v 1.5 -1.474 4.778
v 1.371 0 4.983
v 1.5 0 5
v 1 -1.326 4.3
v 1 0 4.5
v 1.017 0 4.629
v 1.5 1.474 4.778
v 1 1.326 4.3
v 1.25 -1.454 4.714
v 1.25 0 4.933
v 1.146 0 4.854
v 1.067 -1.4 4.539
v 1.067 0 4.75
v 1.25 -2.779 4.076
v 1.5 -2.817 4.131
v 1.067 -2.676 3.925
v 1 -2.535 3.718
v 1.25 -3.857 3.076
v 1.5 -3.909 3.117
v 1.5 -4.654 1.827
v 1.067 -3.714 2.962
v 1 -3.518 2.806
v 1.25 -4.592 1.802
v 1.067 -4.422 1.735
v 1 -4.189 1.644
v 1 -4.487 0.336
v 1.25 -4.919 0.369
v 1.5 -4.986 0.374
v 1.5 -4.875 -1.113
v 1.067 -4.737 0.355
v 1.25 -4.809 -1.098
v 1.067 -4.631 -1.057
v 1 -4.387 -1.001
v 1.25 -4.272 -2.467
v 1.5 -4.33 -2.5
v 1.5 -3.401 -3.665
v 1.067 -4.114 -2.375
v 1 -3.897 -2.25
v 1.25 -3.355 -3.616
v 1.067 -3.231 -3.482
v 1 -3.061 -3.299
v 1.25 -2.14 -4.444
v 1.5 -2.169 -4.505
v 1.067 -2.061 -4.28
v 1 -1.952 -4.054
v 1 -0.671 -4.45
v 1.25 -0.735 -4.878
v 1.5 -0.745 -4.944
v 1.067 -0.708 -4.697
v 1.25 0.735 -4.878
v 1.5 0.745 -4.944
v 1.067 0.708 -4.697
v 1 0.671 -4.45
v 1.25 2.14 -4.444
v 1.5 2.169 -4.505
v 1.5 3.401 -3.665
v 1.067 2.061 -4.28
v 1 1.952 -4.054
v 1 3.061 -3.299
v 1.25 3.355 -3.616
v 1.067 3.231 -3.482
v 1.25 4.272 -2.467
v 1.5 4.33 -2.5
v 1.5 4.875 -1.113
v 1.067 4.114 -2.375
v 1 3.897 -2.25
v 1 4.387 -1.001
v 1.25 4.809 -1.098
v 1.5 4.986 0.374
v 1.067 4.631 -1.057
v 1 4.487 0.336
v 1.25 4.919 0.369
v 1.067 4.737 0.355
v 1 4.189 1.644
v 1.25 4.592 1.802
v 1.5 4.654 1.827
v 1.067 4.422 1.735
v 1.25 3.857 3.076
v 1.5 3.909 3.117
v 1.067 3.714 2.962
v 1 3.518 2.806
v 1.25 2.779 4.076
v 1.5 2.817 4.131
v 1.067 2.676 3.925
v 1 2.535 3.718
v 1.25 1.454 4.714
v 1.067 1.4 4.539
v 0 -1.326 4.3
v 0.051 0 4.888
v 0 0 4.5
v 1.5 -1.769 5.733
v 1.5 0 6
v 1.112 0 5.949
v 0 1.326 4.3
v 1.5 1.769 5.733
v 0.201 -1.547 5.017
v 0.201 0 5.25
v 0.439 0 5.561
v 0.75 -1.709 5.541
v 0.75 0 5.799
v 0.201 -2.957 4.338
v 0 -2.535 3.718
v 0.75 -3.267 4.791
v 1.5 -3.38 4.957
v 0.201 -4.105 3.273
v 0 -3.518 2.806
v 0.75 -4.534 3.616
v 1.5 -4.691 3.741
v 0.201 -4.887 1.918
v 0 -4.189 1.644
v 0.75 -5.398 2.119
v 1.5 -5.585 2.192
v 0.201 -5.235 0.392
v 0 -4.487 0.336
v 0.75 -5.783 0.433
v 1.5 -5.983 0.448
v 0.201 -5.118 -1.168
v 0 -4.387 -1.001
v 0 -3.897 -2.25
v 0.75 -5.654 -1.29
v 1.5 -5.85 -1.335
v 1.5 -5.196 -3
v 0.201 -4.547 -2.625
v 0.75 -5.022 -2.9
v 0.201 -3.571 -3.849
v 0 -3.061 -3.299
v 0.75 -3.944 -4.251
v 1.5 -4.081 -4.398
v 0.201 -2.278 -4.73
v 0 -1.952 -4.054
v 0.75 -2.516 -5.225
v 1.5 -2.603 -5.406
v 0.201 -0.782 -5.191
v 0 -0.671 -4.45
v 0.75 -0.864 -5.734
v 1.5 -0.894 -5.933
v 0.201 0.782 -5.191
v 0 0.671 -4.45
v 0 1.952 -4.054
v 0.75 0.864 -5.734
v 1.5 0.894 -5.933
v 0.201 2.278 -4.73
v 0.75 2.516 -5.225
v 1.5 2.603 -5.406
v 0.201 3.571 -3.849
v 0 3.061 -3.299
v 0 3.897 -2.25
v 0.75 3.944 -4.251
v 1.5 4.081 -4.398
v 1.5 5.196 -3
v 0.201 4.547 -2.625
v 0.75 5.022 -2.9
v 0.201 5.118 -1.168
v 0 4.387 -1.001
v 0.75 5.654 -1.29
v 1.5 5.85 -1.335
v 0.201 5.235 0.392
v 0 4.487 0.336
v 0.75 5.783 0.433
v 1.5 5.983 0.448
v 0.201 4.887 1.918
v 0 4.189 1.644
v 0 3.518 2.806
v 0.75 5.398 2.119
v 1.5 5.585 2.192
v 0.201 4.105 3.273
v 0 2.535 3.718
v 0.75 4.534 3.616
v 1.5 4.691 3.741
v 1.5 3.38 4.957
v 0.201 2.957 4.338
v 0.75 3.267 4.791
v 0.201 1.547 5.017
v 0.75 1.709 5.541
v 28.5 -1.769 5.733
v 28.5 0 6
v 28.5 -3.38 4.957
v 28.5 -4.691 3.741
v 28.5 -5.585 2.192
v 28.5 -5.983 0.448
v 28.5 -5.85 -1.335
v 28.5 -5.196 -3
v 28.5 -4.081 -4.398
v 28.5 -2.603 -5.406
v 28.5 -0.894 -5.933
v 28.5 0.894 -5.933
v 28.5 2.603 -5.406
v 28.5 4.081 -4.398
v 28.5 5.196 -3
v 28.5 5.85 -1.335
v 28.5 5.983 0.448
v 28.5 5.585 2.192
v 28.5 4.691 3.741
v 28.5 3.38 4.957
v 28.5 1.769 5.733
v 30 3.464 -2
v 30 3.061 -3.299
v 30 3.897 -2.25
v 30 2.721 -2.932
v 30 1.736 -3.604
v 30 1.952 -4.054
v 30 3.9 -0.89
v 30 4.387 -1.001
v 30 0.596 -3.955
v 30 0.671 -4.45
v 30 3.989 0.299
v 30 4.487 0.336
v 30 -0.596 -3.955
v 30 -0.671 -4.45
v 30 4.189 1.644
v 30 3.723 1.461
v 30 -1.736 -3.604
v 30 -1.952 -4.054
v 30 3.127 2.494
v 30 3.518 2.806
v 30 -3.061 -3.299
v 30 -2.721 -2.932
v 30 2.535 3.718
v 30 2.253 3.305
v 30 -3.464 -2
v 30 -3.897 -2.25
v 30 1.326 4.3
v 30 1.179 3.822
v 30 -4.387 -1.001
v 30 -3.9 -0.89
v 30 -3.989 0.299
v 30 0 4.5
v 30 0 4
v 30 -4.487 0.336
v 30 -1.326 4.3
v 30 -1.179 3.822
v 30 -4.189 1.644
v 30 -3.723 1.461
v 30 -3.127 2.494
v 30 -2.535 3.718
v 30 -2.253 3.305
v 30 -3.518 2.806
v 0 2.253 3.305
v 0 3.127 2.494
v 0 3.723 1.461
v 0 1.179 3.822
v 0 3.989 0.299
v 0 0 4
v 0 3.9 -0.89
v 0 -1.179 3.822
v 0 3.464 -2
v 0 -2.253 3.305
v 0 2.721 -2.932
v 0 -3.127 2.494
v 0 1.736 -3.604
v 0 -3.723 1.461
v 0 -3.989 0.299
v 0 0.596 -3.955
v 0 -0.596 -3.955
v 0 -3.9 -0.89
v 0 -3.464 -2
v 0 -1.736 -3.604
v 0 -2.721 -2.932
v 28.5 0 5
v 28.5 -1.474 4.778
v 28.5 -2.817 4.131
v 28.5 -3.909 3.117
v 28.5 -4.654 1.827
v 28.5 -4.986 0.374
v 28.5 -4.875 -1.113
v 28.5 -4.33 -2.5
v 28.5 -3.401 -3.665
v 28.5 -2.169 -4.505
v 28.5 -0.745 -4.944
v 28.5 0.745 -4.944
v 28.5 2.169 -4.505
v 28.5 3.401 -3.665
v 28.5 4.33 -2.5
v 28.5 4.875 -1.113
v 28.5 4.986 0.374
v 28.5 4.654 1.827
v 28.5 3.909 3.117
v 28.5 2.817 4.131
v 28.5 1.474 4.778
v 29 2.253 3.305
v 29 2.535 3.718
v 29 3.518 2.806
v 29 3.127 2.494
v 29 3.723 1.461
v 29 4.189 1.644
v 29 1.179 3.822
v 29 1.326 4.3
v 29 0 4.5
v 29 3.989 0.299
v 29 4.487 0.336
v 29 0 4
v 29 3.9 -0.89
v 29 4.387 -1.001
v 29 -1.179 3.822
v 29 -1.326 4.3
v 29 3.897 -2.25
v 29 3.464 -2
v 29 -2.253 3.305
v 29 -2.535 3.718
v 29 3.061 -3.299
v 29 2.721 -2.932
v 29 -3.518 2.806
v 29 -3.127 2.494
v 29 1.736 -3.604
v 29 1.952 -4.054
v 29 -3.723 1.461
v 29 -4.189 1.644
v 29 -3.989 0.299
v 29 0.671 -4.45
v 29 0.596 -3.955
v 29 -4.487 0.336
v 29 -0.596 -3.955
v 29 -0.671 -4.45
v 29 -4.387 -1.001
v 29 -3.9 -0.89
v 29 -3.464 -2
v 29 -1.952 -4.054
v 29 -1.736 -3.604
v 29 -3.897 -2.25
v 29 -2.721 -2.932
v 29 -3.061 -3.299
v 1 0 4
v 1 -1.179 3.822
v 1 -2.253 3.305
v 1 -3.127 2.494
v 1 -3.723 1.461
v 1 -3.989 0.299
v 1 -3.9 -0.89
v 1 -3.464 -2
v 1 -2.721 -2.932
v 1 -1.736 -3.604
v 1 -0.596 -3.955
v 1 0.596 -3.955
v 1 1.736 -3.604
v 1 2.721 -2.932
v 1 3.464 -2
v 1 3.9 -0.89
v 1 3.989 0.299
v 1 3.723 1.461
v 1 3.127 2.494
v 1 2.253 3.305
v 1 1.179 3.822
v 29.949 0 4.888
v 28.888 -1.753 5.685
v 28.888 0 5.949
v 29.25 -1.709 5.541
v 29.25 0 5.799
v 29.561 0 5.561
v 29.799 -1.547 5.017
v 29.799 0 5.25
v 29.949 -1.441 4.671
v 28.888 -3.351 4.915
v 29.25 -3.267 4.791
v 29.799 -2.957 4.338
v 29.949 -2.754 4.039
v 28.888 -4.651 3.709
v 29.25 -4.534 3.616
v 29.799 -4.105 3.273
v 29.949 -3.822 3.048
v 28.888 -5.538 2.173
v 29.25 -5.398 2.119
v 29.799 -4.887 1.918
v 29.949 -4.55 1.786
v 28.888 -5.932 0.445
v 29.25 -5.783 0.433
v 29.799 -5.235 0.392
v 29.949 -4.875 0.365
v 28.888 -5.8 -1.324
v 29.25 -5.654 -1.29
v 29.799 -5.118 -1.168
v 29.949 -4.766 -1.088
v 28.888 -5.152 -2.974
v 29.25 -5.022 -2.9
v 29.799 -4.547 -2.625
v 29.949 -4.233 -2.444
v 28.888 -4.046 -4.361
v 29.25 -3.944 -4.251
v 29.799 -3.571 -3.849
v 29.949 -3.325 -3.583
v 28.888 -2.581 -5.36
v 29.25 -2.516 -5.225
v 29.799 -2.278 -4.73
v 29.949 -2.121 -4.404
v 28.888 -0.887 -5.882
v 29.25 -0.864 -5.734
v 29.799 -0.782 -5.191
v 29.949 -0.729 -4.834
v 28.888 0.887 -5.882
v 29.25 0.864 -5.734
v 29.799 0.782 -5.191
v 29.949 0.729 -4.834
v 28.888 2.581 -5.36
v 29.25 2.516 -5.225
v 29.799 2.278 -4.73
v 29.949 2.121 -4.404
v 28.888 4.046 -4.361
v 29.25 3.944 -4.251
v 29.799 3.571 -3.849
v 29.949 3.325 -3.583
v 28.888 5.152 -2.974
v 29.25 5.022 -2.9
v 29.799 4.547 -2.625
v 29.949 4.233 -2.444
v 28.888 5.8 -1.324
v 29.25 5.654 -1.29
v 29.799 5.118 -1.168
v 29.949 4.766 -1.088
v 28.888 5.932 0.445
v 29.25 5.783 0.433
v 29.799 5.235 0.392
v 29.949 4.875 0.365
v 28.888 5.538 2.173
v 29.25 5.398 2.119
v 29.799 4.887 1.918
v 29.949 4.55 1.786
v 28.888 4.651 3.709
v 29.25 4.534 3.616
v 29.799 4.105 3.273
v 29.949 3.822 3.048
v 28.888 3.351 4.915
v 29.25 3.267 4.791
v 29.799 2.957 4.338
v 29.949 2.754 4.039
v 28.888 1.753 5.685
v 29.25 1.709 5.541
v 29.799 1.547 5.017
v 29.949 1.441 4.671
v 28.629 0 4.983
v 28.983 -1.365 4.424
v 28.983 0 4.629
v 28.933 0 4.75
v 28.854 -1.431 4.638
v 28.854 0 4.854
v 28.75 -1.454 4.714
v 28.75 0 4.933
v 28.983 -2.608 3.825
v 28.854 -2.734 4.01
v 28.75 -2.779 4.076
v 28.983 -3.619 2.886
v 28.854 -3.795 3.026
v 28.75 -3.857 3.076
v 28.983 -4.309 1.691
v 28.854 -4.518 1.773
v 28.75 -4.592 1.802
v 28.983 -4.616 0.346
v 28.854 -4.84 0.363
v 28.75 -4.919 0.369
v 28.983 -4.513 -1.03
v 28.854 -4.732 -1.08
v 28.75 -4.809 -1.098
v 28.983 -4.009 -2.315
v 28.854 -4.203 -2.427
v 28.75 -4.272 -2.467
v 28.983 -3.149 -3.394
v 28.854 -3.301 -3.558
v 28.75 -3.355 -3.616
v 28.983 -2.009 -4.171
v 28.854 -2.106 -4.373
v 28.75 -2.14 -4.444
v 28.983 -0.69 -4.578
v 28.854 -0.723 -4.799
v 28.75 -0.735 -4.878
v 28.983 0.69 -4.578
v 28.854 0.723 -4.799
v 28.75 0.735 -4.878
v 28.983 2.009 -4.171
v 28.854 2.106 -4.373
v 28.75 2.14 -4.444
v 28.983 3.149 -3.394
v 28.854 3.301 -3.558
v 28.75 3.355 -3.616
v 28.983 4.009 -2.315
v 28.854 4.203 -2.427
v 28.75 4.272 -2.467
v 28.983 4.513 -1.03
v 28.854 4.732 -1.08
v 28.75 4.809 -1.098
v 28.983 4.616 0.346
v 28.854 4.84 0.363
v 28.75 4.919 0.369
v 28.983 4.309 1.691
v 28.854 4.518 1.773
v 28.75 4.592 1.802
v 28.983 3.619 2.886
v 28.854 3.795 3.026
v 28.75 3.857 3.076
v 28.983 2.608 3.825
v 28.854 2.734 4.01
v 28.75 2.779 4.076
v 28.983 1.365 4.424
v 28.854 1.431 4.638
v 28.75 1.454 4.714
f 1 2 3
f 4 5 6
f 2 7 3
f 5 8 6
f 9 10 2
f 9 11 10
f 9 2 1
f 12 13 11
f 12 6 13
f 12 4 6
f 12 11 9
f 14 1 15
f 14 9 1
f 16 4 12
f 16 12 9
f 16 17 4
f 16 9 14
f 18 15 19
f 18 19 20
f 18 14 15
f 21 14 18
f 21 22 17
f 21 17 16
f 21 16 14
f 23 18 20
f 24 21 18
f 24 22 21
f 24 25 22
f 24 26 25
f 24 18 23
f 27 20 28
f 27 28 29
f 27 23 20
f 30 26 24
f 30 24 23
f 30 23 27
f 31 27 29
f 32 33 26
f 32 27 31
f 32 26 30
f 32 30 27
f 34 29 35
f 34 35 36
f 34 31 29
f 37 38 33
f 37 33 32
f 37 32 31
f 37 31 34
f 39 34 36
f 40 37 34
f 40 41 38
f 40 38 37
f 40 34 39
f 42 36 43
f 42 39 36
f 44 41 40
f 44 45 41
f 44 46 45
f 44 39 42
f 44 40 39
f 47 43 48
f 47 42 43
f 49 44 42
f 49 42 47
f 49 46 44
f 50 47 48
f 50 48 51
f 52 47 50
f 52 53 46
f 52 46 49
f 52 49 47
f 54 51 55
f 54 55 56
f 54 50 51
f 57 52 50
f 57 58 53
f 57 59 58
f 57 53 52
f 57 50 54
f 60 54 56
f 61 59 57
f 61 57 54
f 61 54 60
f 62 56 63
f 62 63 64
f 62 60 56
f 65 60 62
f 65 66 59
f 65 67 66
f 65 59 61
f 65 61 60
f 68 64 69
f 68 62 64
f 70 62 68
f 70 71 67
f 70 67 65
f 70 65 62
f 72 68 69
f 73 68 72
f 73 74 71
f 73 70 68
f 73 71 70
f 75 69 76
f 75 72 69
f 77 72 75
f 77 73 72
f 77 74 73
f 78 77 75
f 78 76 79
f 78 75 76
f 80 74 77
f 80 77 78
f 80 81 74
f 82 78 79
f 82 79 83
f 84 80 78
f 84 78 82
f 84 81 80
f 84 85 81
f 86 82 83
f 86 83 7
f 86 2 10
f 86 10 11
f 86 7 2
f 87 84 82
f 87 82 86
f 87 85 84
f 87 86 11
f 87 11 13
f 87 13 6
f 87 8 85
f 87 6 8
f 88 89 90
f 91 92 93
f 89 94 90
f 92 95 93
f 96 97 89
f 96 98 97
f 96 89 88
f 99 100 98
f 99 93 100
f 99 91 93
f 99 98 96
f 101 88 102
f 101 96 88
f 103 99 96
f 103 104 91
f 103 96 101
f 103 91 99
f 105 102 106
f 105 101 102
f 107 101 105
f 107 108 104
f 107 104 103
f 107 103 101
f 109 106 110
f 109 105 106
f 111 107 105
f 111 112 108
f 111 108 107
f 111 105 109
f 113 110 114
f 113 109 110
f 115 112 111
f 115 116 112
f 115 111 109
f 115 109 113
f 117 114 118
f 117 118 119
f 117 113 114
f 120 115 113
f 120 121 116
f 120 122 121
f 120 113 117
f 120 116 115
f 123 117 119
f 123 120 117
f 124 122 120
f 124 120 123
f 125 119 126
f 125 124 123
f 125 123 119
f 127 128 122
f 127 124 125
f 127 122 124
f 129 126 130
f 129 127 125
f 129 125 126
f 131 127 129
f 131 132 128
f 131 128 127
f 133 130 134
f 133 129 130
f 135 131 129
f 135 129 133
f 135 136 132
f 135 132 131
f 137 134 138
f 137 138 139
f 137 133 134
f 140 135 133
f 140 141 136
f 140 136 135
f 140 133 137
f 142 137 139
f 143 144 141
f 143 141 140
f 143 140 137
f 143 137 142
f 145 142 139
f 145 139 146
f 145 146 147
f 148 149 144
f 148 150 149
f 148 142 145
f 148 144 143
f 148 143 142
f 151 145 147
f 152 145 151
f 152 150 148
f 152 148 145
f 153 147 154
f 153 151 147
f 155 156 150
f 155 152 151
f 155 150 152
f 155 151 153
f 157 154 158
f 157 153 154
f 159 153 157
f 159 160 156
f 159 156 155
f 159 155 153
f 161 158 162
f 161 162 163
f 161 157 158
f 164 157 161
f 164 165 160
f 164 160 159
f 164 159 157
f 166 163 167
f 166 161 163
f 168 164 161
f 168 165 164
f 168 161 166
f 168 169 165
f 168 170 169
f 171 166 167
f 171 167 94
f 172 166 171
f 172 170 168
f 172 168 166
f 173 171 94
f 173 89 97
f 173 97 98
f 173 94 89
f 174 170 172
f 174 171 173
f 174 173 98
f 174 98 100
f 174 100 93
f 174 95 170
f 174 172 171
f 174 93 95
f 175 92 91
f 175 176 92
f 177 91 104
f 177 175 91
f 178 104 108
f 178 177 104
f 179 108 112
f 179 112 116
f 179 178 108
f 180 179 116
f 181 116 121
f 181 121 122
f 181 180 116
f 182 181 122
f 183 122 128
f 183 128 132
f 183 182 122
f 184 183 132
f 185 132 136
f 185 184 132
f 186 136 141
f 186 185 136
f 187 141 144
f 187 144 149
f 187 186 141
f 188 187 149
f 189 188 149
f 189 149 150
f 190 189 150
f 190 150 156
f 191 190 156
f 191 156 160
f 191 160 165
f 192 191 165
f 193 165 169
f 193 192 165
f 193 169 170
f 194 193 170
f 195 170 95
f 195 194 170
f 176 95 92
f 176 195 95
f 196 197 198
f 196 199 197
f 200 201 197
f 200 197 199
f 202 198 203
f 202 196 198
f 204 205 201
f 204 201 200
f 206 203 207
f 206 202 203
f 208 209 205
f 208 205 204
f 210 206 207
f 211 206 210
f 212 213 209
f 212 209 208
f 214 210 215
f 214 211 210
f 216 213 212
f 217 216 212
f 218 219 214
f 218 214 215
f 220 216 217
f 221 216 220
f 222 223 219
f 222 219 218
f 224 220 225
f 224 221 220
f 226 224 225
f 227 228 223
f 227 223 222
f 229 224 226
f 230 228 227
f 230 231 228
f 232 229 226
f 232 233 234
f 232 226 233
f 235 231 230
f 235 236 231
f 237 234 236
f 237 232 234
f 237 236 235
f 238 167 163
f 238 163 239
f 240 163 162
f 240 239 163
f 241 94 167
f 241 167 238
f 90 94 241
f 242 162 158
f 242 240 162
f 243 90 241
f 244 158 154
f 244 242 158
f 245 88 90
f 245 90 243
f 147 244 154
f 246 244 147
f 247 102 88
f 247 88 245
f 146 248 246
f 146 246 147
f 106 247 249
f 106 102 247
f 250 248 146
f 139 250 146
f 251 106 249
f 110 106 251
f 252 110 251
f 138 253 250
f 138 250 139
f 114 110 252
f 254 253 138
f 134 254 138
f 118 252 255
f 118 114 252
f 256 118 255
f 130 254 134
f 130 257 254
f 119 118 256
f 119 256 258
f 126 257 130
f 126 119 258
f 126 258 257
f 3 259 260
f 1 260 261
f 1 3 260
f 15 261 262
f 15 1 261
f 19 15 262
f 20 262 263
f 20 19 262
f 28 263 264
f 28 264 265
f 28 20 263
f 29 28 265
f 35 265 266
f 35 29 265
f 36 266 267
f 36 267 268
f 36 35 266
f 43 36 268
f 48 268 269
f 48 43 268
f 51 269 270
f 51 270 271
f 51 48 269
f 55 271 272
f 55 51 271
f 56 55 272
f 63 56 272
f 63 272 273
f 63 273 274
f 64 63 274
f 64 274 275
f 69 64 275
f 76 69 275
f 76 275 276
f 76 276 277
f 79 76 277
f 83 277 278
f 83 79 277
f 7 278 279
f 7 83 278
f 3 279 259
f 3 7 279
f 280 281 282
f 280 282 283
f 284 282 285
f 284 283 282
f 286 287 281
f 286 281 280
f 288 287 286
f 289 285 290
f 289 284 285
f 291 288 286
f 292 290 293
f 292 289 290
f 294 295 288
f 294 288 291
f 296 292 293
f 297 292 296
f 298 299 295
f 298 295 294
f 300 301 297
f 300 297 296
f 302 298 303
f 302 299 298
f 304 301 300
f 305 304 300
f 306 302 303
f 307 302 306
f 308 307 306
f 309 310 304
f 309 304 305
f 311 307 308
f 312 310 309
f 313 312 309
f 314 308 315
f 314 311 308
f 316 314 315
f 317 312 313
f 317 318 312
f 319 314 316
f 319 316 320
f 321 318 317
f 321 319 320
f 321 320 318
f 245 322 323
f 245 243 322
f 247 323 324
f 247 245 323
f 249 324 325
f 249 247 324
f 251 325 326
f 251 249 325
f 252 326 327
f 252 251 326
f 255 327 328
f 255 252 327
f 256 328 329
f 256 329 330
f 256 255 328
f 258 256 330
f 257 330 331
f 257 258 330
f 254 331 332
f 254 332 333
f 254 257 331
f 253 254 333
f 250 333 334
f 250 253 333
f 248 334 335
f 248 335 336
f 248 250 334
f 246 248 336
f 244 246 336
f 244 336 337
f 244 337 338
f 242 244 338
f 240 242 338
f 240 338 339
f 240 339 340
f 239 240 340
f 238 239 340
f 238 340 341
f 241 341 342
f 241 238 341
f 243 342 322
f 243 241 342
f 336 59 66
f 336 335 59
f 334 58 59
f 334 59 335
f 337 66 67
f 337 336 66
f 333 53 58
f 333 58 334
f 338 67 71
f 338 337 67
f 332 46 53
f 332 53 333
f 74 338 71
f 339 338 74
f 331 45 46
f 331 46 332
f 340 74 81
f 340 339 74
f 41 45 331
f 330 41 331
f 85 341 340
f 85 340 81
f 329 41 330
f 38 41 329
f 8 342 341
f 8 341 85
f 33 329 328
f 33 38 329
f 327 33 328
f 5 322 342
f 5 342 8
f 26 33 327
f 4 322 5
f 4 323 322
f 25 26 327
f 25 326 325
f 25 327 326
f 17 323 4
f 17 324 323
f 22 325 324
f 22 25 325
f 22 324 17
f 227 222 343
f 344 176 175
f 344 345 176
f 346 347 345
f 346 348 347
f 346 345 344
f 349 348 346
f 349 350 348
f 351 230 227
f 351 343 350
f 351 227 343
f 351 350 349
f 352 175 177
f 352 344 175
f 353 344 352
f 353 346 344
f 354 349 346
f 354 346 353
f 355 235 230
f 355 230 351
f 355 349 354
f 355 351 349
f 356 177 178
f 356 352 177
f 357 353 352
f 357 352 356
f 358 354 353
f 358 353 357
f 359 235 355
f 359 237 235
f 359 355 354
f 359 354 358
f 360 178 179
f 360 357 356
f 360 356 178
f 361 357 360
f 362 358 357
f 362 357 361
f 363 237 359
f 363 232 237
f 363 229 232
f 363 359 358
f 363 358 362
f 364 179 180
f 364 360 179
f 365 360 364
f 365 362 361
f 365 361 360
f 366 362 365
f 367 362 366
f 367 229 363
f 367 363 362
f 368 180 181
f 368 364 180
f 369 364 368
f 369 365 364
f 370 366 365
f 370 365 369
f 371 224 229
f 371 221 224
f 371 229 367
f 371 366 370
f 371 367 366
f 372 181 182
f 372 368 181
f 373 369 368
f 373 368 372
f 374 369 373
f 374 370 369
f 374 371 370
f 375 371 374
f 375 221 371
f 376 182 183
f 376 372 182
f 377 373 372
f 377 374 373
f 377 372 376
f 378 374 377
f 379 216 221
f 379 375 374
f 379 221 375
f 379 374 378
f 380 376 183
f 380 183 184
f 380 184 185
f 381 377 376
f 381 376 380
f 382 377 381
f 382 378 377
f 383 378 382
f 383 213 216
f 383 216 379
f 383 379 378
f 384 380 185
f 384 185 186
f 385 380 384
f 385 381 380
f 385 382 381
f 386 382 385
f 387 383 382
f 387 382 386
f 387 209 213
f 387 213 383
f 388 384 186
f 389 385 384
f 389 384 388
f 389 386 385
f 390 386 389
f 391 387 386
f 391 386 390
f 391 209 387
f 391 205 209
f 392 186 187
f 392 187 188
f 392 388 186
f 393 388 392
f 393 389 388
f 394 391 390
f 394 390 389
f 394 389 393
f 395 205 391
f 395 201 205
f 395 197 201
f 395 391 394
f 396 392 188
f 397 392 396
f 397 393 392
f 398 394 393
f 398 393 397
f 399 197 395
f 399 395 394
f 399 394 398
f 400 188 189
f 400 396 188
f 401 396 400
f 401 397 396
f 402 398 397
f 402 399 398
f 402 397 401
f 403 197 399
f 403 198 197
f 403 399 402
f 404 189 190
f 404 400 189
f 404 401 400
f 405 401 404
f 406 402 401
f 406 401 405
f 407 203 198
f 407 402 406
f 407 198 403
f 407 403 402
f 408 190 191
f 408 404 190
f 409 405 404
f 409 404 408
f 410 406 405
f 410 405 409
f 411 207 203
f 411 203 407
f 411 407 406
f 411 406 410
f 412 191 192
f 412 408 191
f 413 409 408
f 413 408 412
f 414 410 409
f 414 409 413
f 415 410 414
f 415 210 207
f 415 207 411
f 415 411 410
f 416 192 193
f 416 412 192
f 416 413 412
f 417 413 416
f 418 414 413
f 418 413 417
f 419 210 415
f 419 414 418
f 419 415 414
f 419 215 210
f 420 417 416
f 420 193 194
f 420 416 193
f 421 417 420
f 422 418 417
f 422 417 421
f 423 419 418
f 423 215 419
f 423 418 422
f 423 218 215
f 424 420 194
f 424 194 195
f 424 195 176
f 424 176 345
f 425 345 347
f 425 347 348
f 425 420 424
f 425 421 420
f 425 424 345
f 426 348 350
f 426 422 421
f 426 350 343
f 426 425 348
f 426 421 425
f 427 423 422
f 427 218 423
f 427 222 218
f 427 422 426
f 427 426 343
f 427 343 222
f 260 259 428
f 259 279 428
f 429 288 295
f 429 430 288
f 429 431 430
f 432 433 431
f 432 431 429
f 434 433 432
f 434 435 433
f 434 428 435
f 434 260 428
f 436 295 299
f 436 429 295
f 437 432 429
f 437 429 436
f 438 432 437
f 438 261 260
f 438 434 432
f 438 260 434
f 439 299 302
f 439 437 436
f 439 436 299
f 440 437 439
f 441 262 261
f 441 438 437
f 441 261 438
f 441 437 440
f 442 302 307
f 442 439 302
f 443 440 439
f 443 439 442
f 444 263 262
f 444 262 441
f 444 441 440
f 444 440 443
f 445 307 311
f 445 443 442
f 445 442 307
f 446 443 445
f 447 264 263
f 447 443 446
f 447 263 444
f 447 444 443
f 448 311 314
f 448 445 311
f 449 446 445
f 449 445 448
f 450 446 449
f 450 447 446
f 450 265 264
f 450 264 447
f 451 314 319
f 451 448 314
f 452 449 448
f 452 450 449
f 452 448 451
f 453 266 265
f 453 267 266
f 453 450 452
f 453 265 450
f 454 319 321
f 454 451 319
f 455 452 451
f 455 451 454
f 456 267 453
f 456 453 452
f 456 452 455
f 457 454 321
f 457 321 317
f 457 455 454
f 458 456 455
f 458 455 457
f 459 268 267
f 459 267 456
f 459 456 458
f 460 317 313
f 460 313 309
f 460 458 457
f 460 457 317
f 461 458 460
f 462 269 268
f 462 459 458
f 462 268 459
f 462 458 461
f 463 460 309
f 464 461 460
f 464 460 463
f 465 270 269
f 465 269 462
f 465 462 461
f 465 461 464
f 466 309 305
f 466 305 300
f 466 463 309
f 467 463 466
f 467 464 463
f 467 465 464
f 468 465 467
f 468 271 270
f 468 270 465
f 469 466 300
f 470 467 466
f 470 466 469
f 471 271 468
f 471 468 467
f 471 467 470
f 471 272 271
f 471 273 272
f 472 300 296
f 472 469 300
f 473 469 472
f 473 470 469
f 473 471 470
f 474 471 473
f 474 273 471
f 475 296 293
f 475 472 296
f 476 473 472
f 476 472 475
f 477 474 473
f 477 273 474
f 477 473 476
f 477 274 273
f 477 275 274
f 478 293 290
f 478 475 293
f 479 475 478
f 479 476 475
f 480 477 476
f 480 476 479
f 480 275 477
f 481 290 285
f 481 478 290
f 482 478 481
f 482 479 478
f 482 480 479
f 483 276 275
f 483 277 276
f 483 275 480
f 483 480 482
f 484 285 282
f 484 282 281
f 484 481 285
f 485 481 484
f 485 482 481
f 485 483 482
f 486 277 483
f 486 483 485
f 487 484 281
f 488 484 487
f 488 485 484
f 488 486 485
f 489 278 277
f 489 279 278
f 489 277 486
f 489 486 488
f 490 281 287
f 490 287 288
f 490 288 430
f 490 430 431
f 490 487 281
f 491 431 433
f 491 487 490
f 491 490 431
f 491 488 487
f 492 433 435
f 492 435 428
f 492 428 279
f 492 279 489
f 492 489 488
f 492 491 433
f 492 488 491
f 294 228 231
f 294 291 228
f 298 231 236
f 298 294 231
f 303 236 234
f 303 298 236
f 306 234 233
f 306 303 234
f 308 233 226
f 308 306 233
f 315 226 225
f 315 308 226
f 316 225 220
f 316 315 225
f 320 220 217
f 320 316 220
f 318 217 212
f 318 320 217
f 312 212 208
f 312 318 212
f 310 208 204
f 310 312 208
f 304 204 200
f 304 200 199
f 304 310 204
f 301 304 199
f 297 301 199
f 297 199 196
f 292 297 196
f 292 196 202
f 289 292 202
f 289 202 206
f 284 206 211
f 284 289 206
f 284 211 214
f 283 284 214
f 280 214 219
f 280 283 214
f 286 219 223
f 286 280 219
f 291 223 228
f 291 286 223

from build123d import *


with BuildPart() as part:
    # Esquisse1 → Base-Révolution (revolve)
    with BuildSketch(Plane.XY, mode=Mode.PRIVATE) as base_r_volution_sk:
        with BuildLine():
            Line((1.5, 6), (28.5, 6))
            ThreePointArc((28.5, 6), (29.560660172, 5.560660172), (30, 4.5))
            Line((30, 4.5), (30, 4))
            Line((30, 4), (29, 4))
            Line((29, 4), (29, 4.5))
            ThreePointArc((29, 4.5), (28.853553391, 4.853553391), (28.5, 5))
            Line((28.5, 5), (1.5, 5))
            ThreePointArc((1.5, 5), (1.146446609, 4.853553391), (1, 4.5))
            Line((1, 4.5), (1, 4))
            Line((1, 4), (0, 4))
            Line((0, 4), (0, 4.5))
            ThreePointArc((0, 4.5), (0.439339828, 5.560660172), (1.5, 6))
        make_face()
    revolve(base_r_volution_sk.sketch.rotate(Axis((0, 0, 0), (1, 0, 0)), 90), axis=Axis((0, 0, 0), (1, 0, 0)))


solid = part.part
